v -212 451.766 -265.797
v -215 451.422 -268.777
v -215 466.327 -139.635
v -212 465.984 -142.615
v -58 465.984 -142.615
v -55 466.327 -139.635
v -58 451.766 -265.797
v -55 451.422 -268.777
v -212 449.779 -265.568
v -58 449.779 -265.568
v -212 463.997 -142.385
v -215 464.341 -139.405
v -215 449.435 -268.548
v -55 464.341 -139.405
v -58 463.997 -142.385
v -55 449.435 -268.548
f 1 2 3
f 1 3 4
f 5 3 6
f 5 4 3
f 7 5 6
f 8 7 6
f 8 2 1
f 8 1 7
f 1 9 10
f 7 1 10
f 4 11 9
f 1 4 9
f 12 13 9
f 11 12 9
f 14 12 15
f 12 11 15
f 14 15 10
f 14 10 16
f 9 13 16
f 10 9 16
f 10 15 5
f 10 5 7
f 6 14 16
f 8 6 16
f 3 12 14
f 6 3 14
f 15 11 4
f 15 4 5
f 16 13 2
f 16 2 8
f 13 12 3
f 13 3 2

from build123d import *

# Parameters (mm, degrees)
BOSS_EXTRUDE1_START = 116
SKETCH1_W           = 160
SKETCH1_H           = 130
SKETCH1_W_2         = 154
SKETCH1_H_2         = 124
BOSS_EXTRUDE1_DEPTH = 2


with BuildPart() as part:
    # Sketch1 → Boss-Extrude1 (new body)
    with BuildSketch(Plane(origin=(0, 358.879876801, -41.422455829), x_dir=(1, 0, 0), z_dir=(-6.837425950214788e-15, 0.9934047622419533, -0.1146602736566085)).offset(BOSS_EXTRUDE1_START)):
        with Locations((-135, 150.244347434)):
            Rectangle(SKETCH1_W, SKETCH1_H)
        with Locations((-135, 150.244347434)):
            Rectangle(SKETCH1_W_2, SKETCH1_H_2, mode=Mode.SUBTRACT)
    extrude(amount=BOSS_EXTRUDE1_DEPTH)


solid = part.part
